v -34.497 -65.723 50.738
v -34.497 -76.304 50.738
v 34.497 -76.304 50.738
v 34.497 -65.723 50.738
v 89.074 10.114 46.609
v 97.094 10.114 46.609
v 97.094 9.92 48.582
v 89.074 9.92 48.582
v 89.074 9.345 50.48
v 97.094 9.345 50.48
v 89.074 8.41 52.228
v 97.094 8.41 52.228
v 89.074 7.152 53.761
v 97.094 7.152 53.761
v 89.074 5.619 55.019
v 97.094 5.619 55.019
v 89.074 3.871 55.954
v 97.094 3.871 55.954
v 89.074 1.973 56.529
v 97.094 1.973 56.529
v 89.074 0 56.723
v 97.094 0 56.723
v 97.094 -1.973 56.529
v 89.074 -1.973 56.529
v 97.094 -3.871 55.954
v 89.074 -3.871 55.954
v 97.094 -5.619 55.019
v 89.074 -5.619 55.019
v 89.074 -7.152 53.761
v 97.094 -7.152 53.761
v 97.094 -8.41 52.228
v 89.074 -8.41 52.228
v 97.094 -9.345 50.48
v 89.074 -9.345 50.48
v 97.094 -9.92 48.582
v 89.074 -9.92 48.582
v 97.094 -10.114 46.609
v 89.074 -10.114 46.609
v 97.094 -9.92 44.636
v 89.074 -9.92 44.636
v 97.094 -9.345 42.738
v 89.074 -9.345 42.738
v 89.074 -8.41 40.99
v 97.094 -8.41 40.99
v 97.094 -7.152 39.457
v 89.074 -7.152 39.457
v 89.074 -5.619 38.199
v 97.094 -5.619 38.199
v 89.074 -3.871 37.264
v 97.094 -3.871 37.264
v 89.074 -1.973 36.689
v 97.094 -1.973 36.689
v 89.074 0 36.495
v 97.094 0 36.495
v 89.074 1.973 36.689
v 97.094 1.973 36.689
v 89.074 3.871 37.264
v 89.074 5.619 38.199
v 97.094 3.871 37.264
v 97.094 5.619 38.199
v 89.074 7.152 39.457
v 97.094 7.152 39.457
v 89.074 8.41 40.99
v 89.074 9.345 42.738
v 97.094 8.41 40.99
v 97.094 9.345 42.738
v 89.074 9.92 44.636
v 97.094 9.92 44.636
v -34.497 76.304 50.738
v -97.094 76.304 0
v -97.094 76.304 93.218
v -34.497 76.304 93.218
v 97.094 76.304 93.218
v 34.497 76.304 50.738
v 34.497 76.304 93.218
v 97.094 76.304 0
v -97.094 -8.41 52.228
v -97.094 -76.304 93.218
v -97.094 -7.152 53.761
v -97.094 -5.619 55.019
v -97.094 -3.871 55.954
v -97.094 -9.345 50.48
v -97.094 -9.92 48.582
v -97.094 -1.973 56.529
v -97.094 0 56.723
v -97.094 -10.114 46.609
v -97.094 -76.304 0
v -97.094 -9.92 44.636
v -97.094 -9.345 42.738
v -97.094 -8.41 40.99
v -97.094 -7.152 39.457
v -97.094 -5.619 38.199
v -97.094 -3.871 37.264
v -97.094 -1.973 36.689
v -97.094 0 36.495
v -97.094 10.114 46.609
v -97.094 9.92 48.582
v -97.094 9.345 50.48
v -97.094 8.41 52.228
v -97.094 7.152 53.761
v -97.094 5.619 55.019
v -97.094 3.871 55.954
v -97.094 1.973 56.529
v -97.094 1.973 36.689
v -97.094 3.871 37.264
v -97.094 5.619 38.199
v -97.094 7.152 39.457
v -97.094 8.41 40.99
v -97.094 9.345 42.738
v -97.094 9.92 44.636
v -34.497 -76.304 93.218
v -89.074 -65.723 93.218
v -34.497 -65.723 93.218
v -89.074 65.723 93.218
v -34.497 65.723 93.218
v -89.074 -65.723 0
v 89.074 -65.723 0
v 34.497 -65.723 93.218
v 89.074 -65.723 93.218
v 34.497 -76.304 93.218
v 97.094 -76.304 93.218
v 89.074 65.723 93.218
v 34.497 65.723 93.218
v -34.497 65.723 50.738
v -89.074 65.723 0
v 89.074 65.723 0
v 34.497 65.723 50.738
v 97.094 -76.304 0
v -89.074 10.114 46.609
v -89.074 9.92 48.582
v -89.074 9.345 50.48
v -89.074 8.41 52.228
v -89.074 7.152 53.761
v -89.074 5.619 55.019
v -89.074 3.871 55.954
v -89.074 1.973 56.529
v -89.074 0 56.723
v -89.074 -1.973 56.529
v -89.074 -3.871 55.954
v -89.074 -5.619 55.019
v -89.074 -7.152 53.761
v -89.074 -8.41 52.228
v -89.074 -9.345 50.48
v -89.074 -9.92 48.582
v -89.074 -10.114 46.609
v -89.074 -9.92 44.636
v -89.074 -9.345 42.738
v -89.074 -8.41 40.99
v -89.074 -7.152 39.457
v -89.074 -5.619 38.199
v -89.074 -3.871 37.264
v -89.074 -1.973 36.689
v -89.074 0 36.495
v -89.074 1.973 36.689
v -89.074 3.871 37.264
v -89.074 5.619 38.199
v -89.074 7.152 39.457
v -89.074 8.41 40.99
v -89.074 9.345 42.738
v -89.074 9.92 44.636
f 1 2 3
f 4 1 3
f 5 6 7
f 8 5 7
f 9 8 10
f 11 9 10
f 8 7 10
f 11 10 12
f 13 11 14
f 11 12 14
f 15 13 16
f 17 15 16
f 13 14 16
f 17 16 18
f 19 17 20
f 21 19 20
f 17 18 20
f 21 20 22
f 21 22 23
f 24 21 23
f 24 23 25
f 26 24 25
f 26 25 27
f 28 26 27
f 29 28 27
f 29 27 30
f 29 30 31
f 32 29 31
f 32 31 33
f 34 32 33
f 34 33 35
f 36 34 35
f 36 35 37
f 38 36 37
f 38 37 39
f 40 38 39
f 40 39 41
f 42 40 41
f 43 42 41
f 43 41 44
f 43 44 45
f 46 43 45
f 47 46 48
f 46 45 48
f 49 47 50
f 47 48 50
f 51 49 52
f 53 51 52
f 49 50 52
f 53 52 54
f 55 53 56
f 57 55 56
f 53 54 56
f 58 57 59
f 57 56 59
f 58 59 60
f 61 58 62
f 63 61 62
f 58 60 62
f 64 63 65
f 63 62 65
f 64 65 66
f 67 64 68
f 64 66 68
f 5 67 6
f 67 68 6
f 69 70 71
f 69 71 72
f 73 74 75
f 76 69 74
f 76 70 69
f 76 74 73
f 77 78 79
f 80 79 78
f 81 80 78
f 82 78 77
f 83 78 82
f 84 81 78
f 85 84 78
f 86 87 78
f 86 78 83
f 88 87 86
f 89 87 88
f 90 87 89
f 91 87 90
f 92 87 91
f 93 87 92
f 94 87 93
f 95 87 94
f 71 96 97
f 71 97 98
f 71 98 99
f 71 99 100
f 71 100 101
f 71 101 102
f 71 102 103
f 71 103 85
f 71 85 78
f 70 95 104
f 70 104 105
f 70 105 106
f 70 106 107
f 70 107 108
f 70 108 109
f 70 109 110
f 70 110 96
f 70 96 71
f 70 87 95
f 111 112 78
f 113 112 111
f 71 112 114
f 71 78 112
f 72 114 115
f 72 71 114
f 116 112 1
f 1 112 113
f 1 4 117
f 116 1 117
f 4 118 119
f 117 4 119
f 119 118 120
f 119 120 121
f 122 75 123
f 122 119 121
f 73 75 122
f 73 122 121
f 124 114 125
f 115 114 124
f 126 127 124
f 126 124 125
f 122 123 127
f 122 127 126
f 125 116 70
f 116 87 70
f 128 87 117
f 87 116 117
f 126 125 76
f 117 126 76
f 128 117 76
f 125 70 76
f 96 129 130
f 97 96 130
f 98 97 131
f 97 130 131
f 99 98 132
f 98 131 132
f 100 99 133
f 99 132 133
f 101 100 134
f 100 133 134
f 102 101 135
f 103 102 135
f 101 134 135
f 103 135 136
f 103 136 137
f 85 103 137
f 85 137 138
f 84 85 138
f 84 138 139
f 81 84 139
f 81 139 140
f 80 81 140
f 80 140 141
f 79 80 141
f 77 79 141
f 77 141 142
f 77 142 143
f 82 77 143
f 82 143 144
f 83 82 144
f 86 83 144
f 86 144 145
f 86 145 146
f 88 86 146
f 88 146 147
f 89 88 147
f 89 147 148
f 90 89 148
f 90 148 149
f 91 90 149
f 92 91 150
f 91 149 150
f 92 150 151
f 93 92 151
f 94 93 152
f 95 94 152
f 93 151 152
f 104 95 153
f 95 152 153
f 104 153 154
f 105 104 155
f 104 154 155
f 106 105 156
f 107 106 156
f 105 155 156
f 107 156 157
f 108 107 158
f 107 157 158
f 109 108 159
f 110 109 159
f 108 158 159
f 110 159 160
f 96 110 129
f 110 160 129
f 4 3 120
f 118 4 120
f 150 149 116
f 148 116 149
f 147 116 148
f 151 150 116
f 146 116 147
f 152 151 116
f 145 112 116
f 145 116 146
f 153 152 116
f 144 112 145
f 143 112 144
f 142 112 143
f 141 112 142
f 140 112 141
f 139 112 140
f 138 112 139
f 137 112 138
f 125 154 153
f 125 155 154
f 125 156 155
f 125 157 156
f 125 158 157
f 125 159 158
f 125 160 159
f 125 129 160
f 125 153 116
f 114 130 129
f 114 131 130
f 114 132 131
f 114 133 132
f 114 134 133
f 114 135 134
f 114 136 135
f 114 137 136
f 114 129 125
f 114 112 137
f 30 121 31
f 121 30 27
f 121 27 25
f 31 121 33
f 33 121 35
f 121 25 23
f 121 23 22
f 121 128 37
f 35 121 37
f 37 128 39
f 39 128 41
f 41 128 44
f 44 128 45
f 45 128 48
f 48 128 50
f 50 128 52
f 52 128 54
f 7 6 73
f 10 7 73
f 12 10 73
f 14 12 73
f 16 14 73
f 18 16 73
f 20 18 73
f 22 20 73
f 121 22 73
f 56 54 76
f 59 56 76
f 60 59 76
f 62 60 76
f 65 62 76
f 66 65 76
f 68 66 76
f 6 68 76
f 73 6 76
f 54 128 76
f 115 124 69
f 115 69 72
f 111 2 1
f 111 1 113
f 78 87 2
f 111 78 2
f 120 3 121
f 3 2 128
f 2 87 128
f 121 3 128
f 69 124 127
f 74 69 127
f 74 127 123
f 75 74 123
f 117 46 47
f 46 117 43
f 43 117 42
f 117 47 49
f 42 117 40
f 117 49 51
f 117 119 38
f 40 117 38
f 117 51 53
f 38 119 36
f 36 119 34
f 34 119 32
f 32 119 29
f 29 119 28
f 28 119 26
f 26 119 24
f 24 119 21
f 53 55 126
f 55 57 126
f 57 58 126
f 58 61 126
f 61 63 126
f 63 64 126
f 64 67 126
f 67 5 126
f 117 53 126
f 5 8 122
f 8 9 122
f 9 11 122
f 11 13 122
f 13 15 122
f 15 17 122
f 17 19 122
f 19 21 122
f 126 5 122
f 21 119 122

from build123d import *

# Parameters (mm, degrees)
F0_W     = 194.187328
F0_H     = 152.607068
F1_DEPTH = 93.218
F2_W     = 178.14736
F2_H     = 131.446124
F3_DEPTH = 149.606
F4_W     = 68.994268
F4_H     = 84.95936
F5_DEPTH = 236.728
F6_R     = 10.114418
F7_DEPTH = 293.624


with BuildPart() as f1:
    # F0 (on Top) → F1 (new body)
    with BuildSketch(Plane.XY):
        Rectangle(F0_W, F0_H)
    extrude(amount=F1_DEPTH)

    # F2 (on face) → F3 (cut)
    with BuildSketch(Plane.XY.offset(93.218)):
        Rectangle(F2_W, F2_H)
    extrude(amount=-F3_DEPTH, mode=Mode.SUBTRACT)

    # F4 (on face) → F5 (cut)
    with BuildSketch(Plane.XZ.offset(76.303534)):
        with Locations((0, 93.218)):
            Rectangle(F4_W, F4_H)
    extrude(amount=-F5_DEPTH, mode=Mode.SUBTRACT)

    # F6 (on face) → F7 (cut)
    with BuildSketch(Plane.YZ.offset(97.093664)):
        with Locations((0, 46.609)):
            Circle(F6_R)
    extrude(amount=-F7_DEPTH, mode=Mode.SUBTRACT)


solid = f1.part
